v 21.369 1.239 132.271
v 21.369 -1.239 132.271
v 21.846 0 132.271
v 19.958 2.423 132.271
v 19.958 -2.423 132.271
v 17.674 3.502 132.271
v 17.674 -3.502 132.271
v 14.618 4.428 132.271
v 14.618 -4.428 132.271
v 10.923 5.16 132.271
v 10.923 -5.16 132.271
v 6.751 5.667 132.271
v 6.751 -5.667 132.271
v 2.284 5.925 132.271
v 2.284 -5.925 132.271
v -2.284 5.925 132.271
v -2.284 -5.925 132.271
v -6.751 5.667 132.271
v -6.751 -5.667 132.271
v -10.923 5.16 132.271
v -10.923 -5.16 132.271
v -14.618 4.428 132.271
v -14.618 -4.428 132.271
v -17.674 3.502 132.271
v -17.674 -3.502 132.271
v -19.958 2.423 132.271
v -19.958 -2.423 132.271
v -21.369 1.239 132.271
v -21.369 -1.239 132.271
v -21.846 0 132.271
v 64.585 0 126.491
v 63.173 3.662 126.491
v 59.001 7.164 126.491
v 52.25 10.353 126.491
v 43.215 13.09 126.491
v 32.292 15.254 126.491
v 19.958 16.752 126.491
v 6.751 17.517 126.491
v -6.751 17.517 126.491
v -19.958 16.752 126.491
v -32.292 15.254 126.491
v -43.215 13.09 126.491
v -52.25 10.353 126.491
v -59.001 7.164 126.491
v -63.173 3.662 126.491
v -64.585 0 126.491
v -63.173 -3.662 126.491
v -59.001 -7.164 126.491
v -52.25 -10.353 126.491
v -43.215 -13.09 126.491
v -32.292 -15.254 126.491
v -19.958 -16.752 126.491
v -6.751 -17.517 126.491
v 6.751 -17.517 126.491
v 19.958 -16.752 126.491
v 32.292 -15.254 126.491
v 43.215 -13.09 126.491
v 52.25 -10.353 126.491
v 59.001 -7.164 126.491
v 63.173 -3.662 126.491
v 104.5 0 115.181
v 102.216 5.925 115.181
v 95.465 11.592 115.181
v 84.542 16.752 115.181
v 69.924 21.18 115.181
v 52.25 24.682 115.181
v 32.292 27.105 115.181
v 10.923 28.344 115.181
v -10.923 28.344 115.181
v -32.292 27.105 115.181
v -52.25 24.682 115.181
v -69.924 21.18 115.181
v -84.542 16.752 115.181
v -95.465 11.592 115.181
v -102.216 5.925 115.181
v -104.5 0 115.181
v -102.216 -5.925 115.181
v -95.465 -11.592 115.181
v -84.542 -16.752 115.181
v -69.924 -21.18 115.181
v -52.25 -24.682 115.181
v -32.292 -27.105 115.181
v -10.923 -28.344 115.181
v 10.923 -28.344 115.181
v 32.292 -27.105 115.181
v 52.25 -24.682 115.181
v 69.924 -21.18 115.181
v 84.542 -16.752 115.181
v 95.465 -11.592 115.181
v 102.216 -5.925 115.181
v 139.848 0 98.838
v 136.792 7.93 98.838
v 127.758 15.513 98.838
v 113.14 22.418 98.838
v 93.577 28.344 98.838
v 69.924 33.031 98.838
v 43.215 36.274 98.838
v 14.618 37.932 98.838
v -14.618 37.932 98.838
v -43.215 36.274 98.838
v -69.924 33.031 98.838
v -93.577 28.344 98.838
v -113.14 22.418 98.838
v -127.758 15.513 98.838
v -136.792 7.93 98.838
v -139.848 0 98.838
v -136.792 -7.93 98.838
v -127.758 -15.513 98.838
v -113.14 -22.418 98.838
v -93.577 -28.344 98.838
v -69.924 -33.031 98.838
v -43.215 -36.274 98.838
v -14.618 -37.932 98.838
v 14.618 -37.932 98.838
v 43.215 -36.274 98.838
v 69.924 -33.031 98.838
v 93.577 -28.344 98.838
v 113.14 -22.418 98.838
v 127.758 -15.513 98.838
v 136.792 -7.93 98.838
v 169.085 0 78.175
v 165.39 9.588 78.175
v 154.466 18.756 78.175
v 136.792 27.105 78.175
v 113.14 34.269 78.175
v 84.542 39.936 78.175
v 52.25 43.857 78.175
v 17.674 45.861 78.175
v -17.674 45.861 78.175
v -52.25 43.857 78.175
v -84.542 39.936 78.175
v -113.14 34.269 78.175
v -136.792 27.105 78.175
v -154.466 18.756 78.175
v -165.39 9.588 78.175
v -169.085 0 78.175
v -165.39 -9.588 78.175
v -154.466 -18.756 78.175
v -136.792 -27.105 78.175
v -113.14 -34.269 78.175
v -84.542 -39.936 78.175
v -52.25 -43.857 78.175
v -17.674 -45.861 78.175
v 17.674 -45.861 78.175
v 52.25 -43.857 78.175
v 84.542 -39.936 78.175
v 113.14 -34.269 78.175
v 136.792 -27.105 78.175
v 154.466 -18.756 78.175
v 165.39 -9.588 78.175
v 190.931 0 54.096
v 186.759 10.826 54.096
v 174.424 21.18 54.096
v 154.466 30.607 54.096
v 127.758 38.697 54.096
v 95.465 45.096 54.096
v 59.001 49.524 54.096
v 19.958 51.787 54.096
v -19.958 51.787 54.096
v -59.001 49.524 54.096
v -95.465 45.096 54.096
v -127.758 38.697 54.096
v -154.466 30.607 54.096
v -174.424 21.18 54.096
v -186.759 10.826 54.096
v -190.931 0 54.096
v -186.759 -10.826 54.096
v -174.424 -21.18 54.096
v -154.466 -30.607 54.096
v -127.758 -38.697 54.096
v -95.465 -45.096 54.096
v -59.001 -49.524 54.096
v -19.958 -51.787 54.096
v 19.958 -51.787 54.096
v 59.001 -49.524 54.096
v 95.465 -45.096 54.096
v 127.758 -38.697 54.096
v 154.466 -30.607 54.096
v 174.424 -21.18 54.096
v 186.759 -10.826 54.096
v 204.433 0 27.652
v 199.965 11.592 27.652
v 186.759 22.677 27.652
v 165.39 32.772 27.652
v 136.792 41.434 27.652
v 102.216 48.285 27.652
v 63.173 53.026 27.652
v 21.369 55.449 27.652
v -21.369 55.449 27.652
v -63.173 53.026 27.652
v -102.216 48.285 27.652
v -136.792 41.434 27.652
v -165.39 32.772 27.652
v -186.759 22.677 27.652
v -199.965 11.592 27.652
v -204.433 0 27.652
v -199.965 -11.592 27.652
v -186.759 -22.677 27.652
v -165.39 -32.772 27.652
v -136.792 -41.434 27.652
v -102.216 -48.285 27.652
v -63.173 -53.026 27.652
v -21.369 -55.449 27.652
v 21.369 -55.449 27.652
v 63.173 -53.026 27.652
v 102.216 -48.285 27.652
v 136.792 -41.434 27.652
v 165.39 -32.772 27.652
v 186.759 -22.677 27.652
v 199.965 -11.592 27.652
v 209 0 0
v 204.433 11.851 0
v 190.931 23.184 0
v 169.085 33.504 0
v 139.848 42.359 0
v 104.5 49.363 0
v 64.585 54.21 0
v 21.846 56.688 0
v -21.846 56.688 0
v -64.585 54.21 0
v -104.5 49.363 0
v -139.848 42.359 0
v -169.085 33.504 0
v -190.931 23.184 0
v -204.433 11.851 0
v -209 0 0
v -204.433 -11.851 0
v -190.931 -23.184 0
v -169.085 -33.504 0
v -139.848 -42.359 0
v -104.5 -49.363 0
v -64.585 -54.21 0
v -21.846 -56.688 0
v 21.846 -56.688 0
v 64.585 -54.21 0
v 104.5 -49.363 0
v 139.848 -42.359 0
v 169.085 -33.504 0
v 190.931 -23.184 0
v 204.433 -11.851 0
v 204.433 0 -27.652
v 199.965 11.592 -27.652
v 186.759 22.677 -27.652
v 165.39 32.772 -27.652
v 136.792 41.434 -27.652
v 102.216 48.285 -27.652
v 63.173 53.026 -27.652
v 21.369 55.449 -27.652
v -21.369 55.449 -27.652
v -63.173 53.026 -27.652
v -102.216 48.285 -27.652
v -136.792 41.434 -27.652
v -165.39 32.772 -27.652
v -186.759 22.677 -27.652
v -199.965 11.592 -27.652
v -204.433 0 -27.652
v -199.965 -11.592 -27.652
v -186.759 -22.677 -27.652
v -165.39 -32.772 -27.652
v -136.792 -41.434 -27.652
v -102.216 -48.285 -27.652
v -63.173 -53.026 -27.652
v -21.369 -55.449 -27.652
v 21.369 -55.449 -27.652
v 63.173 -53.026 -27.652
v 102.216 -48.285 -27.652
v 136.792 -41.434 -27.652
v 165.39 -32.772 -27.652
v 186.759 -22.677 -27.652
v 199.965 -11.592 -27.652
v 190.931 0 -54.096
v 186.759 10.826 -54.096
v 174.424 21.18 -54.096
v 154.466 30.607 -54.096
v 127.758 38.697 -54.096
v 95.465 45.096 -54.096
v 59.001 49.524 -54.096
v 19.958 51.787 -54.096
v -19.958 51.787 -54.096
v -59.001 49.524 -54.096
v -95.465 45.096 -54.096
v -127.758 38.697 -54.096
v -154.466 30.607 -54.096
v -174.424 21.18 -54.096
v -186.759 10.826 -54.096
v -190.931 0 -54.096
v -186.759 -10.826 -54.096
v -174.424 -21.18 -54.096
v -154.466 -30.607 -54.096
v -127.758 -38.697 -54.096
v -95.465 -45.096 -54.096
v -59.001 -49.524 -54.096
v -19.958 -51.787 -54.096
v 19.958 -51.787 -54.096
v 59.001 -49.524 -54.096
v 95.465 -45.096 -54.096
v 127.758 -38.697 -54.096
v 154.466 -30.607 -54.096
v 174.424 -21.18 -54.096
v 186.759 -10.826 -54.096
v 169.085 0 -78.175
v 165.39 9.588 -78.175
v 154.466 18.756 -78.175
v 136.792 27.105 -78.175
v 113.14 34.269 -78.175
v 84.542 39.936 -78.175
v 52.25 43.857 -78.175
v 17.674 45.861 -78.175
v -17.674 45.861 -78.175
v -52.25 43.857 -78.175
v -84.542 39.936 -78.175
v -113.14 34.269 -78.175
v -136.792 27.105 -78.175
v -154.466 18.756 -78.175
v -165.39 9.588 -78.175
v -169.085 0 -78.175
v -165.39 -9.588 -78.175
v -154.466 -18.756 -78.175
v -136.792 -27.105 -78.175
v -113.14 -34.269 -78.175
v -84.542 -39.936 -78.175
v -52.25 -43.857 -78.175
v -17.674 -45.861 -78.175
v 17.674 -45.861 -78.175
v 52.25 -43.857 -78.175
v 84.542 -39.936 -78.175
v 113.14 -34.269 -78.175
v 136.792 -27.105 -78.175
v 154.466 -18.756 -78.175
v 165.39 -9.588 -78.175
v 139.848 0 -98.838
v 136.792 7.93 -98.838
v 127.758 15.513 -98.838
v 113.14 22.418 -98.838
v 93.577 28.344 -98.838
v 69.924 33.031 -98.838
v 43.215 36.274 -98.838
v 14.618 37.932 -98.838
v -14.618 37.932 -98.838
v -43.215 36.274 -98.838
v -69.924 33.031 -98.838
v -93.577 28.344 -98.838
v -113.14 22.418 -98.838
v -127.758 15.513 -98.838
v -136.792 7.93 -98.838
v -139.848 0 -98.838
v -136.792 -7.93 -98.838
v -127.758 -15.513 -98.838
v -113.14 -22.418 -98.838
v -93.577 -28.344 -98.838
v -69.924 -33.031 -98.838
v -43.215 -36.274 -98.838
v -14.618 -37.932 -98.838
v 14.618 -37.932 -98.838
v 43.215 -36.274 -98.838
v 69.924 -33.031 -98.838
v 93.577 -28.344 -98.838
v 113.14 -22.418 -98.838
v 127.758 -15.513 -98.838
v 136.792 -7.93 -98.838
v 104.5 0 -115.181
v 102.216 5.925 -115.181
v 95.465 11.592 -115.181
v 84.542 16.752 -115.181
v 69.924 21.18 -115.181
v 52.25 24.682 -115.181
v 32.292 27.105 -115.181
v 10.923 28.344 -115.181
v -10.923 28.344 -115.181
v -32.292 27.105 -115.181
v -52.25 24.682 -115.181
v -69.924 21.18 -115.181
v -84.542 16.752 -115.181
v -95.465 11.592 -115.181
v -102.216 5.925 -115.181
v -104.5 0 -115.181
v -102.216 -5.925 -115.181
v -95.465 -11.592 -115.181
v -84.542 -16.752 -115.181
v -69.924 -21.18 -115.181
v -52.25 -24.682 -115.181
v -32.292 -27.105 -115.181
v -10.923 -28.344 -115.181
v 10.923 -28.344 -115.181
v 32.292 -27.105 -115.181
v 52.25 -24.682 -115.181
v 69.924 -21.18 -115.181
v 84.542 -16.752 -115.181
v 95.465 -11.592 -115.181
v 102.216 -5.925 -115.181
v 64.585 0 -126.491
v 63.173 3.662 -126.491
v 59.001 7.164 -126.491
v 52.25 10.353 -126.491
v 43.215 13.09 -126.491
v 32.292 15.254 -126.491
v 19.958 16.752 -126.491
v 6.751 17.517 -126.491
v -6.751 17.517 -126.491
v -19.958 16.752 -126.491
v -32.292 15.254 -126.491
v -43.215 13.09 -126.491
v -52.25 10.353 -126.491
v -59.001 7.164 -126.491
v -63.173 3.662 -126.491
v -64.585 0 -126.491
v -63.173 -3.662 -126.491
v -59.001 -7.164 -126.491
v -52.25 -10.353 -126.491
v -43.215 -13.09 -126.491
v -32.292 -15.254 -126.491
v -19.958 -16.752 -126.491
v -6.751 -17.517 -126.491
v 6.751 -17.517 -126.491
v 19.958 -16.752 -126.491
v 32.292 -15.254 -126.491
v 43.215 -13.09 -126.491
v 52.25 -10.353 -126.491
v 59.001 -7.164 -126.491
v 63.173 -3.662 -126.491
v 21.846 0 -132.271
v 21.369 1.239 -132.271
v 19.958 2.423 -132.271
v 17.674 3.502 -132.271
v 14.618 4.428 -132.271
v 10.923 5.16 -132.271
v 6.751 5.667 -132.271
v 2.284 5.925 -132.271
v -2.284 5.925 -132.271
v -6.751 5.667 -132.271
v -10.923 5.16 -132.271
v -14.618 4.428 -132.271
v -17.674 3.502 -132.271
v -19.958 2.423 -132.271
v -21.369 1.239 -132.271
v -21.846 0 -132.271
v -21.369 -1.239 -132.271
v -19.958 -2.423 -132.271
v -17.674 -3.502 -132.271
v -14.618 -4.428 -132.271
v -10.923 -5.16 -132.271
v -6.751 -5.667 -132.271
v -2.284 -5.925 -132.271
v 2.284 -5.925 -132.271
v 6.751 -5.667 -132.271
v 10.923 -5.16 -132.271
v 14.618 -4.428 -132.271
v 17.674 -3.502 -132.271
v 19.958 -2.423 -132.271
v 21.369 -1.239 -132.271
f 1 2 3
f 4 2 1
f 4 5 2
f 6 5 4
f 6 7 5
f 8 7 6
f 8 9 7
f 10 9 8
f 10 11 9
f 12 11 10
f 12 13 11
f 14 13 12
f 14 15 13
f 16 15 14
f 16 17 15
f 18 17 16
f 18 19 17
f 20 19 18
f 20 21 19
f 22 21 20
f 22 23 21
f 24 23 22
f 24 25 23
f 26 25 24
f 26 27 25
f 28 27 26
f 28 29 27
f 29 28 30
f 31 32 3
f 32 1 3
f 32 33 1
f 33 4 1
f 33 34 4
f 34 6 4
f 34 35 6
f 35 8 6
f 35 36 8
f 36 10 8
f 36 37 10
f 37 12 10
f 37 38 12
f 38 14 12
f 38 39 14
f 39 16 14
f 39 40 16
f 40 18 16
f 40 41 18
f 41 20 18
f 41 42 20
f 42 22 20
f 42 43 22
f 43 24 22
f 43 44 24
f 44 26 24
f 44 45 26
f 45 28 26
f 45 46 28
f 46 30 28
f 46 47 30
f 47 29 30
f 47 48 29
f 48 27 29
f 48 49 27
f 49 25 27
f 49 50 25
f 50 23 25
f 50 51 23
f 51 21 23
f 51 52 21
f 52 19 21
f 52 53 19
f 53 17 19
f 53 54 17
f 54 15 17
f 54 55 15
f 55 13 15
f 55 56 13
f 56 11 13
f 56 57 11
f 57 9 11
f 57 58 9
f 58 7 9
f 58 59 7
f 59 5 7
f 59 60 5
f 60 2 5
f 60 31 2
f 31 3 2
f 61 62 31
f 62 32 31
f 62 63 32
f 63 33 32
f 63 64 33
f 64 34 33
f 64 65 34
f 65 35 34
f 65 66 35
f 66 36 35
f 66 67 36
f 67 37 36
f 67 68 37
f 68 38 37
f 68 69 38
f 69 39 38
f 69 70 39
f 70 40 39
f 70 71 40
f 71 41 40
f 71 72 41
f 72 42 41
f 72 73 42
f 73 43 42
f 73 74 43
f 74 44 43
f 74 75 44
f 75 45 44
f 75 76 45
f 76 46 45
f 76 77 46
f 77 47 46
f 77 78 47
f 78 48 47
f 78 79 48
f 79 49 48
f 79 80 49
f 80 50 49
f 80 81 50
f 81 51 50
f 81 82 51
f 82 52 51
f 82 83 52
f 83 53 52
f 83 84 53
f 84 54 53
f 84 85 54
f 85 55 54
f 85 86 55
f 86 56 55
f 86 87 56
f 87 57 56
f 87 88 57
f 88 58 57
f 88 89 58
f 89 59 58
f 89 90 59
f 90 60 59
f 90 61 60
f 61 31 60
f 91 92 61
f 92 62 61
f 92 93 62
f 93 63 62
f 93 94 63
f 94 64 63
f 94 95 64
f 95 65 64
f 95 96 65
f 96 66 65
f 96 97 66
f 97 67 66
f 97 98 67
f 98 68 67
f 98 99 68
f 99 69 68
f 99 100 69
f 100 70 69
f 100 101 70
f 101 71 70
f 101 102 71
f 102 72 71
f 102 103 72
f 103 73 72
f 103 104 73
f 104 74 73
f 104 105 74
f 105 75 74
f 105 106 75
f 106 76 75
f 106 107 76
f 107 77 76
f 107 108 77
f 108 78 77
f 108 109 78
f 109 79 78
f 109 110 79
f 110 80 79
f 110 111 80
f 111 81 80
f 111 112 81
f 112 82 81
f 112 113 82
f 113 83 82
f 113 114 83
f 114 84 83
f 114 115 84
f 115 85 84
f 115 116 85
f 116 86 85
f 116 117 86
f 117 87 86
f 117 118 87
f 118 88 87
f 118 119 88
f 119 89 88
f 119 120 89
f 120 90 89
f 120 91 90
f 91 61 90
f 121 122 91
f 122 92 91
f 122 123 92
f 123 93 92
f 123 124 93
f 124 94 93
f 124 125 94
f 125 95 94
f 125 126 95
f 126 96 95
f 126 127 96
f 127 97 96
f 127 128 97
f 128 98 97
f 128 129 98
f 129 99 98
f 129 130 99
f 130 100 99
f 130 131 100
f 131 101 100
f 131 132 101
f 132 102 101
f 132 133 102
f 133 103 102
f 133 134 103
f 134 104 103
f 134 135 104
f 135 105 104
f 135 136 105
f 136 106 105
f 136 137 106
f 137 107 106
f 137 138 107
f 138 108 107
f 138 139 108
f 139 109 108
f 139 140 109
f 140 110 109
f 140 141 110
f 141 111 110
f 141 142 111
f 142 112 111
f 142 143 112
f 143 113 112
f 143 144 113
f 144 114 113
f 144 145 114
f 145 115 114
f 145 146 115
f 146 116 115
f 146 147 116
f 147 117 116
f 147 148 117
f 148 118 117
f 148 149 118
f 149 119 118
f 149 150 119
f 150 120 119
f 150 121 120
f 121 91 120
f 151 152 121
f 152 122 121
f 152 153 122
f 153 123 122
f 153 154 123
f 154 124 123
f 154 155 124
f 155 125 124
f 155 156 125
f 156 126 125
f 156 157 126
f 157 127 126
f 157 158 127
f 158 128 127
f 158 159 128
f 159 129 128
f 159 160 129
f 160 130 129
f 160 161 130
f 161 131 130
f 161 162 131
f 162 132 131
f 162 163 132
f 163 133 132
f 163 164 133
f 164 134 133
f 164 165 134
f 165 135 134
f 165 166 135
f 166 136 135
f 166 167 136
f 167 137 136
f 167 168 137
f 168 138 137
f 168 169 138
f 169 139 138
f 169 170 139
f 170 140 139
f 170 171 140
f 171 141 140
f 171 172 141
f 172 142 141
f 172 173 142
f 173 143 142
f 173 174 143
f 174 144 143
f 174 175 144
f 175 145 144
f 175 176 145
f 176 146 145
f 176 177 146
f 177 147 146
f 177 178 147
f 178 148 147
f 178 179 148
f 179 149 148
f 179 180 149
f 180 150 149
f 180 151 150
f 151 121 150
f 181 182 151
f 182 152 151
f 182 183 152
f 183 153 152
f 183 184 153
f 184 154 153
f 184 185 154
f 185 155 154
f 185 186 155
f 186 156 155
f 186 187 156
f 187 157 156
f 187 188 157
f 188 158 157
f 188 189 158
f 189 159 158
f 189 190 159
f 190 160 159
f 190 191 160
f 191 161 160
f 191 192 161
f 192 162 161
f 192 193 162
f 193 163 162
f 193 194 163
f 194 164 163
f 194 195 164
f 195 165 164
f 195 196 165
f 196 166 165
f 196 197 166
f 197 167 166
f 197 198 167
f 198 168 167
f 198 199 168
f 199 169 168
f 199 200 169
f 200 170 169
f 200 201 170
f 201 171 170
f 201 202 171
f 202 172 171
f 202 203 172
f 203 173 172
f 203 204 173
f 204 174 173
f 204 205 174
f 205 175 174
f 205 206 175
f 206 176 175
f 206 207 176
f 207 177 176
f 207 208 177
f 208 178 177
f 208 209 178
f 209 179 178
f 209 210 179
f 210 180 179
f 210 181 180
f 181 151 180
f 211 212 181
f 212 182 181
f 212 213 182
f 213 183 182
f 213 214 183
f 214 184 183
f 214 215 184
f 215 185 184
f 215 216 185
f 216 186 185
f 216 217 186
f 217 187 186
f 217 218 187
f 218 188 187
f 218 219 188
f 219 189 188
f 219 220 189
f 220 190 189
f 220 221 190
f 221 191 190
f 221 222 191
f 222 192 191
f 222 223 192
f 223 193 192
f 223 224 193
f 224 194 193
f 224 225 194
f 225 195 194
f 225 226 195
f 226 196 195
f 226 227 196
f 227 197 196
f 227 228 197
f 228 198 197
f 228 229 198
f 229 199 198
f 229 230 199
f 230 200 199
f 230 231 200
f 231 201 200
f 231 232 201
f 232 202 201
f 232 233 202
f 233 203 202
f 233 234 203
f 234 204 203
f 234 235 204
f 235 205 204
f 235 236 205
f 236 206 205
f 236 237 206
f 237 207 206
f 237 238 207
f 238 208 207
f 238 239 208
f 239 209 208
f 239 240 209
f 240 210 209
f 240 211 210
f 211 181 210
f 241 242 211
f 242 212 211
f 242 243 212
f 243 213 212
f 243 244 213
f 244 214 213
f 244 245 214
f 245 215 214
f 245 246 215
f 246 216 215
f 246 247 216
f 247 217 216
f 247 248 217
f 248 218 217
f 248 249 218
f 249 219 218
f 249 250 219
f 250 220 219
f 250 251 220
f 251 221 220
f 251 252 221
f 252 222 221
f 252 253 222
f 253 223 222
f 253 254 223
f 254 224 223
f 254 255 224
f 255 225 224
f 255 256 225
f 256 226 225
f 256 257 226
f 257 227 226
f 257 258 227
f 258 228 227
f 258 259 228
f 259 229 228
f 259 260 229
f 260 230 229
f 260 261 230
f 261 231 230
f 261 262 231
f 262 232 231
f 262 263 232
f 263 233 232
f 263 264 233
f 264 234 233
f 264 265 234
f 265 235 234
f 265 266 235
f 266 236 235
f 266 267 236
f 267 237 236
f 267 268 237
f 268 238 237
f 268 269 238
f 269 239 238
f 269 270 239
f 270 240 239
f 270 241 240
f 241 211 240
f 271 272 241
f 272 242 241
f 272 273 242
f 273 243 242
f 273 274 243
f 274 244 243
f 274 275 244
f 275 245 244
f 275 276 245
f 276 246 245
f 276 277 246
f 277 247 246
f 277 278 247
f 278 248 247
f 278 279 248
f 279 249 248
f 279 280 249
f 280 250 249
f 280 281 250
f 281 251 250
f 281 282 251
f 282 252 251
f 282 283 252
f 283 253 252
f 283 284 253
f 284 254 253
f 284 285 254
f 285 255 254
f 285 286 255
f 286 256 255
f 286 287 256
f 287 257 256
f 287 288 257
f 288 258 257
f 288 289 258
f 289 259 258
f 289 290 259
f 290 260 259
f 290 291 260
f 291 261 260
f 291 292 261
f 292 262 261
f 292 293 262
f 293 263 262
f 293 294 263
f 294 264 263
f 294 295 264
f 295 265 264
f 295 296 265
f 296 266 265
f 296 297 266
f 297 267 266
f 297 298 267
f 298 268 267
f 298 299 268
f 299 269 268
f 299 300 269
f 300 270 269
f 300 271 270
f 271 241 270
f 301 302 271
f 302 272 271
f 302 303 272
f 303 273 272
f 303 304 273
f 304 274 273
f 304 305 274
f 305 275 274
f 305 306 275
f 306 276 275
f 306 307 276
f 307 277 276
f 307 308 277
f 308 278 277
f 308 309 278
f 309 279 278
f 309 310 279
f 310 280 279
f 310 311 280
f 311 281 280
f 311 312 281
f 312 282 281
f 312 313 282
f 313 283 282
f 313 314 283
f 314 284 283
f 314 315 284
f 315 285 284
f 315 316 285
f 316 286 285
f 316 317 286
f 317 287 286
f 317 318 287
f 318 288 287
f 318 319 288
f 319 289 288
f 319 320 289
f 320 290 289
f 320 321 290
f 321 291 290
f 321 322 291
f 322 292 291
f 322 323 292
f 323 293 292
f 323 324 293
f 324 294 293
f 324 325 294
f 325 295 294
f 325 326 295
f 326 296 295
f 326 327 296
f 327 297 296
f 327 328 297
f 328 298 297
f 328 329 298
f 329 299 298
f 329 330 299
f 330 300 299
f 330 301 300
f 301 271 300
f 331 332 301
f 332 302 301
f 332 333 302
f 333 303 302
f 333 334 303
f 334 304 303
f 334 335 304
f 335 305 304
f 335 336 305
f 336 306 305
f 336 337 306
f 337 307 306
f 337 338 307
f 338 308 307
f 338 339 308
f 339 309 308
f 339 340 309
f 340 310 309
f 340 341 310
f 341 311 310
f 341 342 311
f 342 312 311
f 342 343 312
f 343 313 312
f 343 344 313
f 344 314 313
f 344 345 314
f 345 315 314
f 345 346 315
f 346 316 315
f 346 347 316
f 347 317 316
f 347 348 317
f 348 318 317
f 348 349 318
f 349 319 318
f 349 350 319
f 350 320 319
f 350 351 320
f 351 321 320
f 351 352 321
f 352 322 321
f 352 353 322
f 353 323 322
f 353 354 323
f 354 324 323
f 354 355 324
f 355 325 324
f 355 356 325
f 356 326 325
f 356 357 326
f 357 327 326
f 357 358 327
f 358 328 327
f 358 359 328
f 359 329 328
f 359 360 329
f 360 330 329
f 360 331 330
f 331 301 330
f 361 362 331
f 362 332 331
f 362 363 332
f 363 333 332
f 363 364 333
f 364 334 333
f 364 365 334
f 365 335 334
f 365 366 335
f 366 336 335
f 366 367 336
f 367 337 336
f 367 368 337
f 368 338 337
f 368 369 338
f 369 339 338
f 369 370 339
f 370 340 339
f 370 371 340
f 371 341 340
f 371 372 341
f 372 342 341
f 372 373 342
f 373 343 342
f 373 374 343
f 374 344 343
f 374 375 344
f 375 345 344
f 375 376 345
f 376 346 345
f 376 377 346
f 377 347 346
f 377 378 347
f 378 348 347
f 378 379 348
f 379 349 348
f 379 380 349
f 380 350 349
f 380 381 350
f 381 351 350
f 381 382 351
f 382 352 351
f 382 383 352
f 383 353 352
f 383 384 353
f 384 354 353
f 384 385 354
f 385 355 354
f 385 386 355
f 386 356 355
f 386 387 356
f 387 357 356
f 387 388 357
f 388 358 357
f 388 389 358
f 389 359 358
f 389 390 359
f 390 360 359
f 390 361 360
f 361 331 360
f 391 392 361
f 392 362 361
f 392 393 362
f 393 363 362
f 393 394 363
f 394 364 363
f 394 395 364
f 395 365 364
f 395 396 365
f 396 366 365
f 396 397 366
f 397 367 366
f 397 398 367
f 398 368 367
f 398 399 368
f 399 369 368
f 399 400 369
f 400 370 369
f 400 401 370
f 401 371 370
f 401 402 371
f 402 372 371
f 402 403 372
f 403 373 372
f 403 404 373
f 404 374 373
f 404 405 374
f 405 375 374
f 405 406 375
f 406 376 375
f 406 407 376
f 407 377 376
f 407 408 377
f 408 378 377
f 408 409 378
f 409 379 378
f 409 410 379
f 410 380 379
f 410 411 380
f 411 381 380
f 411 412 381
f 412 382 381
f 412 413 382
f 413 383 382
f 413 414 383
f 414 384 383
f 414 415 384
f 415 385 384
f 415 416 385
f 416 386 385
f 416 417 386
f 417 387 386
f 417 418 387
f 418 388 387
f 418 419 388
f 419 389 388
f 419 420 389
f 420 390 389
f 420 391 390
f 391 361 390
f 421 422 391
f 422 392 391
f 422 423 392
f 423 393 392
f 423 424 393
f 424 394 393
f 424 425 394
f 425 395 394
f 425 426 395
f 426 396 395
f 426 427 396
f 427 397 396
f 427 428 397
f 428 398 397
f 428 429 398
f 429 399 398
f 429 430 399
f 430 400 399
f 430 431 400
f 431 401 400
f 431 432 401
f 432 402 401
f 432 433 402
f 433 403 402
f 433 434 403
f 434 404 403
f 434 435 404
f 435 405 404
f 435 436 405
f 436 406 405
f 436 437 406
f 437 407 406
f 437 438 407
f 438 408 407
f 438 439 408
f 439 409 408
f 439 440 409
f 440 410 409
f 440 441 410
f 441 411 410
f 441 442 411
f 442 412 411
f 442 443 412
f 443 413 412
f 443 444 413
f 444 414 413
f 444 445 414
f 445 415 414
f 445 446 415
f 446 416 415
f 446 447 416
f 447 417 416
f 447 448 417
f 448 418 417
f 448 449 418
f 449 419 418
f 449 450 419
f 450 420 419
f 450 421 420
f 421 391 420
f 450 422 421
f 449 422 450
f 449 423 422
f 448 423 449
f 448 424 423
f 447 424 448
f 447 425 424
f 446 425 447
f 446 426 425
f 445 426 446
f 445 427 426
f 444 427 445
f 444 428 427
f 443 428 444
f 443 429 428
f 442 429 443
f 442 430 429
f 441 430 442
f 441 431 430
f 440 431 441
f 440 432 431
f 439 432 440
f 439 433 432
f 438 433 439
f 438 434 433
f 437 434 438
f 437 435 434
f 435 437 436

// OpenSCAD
// Generated by SolidPython 1.0.1 on 2020-07-29 00:46:49


scale(v = [11, 3, 7]) {
	sphere(r = 19);
}
/***********************************************
*********      SolidPython code:      **********
************************************************
 
# import packages: SolidPython
from solid import *
from solid.utils import *
from itertools import chain, combinations, permutations


class Resize:

    def __init__(self, scad_file):
        self.scad_file = scad_file
        #self.scad_file = import_scad(scad_file)
        # cone/cylinder param:
        self.r1 = 0
        self.r2 = 0
        self.h = 0
        # rectangular prism param:
        self.w = 0
        self.l = 0
        # ellipse param:
        self.r = 0

    # import OpenScad code (file name corresponds to shape)


    # classify shape + parameters
    def assign(self, param1, param2, param3):
        if self.scad_file == 'cone.scad':
            self.r1 = param1
            self.r2 = param2
            self.h = param3
        elif self.scad_file == 'cylinder.scad':
            self.r1 = param1
            self.r2 = param2
            self.h = param3
        elif self.scad_file == 'rectangularPrism.scad':
            self.h = param1
            self.l = param2
            self.w = param3
        else:
            self.r = param1
            self.h = param2

    # resize parameters
    def iterate(self):
        x = range(3, 20, 2)
        i = 1
        if self.scad_file == 'cone.scad':
            tempList = list(permutations(x, 2))
            for temp in tempList:
                param1 = temp[0]
                param2 = temp[1]
                filepath = 'produced_scad_files/' + 'cone' + str(param1) + '_' + str(param2) + '_' + '.scad'
                scad_render_to_file(cylinder(h=param1, r1=param2, r2=0), filepath)

        elif self.scad_file == 'cylinder.scad':
            tempList = list(permutations(x, 3))
            for temp in tempList:
                param1 = temp[0]
                param2 = temp[1]
                filepath = 'produced_scad_files/' + 'cylinder' + str(param1) + '_' + str(param2) + '_' + '.scad'
                scad_render_to_file(cylinder(h=param1, r1=param2, r2=param2), filepath)

        elif self.scad_file == 'rectangularPrism.scad':
            tempList = list(permutations(x, 3))
            for temp in tempList:
                param1 = temp[0]
                param2 = temp[1]
                param3 = temp[2]
                filepath = 'produced_scad_files/' + 'rectangularPrism' + str(param1) + '_' + str(param2) + '_' + str(
                    param3) + '.scad'
                scad_render_to_file(cube(size=(param1, param2, param3)), filepath)

        elif self.scad_file == 'ellipse.scad':
            tempList = list(permutations(x, 4))
            for temp in tempList:
                param1 = temp[0]
                param2 = temp[1]
                param3 = temp[2]
                param4 = temp[3]
                filepath = 'produced_scad_files/' + 'ellipse' + str(param1) + '_' + str(param2) + '_' + str(param3) + '_' + str(param4) + '.scad'
                scad_render_to_file(scale([param1, param2, param3])(sphere(r=param4)), filepath)

    def render_to_scadfile(self):
        scad_render_to_file(scad, 'example.scad') 
 
************************************************/
